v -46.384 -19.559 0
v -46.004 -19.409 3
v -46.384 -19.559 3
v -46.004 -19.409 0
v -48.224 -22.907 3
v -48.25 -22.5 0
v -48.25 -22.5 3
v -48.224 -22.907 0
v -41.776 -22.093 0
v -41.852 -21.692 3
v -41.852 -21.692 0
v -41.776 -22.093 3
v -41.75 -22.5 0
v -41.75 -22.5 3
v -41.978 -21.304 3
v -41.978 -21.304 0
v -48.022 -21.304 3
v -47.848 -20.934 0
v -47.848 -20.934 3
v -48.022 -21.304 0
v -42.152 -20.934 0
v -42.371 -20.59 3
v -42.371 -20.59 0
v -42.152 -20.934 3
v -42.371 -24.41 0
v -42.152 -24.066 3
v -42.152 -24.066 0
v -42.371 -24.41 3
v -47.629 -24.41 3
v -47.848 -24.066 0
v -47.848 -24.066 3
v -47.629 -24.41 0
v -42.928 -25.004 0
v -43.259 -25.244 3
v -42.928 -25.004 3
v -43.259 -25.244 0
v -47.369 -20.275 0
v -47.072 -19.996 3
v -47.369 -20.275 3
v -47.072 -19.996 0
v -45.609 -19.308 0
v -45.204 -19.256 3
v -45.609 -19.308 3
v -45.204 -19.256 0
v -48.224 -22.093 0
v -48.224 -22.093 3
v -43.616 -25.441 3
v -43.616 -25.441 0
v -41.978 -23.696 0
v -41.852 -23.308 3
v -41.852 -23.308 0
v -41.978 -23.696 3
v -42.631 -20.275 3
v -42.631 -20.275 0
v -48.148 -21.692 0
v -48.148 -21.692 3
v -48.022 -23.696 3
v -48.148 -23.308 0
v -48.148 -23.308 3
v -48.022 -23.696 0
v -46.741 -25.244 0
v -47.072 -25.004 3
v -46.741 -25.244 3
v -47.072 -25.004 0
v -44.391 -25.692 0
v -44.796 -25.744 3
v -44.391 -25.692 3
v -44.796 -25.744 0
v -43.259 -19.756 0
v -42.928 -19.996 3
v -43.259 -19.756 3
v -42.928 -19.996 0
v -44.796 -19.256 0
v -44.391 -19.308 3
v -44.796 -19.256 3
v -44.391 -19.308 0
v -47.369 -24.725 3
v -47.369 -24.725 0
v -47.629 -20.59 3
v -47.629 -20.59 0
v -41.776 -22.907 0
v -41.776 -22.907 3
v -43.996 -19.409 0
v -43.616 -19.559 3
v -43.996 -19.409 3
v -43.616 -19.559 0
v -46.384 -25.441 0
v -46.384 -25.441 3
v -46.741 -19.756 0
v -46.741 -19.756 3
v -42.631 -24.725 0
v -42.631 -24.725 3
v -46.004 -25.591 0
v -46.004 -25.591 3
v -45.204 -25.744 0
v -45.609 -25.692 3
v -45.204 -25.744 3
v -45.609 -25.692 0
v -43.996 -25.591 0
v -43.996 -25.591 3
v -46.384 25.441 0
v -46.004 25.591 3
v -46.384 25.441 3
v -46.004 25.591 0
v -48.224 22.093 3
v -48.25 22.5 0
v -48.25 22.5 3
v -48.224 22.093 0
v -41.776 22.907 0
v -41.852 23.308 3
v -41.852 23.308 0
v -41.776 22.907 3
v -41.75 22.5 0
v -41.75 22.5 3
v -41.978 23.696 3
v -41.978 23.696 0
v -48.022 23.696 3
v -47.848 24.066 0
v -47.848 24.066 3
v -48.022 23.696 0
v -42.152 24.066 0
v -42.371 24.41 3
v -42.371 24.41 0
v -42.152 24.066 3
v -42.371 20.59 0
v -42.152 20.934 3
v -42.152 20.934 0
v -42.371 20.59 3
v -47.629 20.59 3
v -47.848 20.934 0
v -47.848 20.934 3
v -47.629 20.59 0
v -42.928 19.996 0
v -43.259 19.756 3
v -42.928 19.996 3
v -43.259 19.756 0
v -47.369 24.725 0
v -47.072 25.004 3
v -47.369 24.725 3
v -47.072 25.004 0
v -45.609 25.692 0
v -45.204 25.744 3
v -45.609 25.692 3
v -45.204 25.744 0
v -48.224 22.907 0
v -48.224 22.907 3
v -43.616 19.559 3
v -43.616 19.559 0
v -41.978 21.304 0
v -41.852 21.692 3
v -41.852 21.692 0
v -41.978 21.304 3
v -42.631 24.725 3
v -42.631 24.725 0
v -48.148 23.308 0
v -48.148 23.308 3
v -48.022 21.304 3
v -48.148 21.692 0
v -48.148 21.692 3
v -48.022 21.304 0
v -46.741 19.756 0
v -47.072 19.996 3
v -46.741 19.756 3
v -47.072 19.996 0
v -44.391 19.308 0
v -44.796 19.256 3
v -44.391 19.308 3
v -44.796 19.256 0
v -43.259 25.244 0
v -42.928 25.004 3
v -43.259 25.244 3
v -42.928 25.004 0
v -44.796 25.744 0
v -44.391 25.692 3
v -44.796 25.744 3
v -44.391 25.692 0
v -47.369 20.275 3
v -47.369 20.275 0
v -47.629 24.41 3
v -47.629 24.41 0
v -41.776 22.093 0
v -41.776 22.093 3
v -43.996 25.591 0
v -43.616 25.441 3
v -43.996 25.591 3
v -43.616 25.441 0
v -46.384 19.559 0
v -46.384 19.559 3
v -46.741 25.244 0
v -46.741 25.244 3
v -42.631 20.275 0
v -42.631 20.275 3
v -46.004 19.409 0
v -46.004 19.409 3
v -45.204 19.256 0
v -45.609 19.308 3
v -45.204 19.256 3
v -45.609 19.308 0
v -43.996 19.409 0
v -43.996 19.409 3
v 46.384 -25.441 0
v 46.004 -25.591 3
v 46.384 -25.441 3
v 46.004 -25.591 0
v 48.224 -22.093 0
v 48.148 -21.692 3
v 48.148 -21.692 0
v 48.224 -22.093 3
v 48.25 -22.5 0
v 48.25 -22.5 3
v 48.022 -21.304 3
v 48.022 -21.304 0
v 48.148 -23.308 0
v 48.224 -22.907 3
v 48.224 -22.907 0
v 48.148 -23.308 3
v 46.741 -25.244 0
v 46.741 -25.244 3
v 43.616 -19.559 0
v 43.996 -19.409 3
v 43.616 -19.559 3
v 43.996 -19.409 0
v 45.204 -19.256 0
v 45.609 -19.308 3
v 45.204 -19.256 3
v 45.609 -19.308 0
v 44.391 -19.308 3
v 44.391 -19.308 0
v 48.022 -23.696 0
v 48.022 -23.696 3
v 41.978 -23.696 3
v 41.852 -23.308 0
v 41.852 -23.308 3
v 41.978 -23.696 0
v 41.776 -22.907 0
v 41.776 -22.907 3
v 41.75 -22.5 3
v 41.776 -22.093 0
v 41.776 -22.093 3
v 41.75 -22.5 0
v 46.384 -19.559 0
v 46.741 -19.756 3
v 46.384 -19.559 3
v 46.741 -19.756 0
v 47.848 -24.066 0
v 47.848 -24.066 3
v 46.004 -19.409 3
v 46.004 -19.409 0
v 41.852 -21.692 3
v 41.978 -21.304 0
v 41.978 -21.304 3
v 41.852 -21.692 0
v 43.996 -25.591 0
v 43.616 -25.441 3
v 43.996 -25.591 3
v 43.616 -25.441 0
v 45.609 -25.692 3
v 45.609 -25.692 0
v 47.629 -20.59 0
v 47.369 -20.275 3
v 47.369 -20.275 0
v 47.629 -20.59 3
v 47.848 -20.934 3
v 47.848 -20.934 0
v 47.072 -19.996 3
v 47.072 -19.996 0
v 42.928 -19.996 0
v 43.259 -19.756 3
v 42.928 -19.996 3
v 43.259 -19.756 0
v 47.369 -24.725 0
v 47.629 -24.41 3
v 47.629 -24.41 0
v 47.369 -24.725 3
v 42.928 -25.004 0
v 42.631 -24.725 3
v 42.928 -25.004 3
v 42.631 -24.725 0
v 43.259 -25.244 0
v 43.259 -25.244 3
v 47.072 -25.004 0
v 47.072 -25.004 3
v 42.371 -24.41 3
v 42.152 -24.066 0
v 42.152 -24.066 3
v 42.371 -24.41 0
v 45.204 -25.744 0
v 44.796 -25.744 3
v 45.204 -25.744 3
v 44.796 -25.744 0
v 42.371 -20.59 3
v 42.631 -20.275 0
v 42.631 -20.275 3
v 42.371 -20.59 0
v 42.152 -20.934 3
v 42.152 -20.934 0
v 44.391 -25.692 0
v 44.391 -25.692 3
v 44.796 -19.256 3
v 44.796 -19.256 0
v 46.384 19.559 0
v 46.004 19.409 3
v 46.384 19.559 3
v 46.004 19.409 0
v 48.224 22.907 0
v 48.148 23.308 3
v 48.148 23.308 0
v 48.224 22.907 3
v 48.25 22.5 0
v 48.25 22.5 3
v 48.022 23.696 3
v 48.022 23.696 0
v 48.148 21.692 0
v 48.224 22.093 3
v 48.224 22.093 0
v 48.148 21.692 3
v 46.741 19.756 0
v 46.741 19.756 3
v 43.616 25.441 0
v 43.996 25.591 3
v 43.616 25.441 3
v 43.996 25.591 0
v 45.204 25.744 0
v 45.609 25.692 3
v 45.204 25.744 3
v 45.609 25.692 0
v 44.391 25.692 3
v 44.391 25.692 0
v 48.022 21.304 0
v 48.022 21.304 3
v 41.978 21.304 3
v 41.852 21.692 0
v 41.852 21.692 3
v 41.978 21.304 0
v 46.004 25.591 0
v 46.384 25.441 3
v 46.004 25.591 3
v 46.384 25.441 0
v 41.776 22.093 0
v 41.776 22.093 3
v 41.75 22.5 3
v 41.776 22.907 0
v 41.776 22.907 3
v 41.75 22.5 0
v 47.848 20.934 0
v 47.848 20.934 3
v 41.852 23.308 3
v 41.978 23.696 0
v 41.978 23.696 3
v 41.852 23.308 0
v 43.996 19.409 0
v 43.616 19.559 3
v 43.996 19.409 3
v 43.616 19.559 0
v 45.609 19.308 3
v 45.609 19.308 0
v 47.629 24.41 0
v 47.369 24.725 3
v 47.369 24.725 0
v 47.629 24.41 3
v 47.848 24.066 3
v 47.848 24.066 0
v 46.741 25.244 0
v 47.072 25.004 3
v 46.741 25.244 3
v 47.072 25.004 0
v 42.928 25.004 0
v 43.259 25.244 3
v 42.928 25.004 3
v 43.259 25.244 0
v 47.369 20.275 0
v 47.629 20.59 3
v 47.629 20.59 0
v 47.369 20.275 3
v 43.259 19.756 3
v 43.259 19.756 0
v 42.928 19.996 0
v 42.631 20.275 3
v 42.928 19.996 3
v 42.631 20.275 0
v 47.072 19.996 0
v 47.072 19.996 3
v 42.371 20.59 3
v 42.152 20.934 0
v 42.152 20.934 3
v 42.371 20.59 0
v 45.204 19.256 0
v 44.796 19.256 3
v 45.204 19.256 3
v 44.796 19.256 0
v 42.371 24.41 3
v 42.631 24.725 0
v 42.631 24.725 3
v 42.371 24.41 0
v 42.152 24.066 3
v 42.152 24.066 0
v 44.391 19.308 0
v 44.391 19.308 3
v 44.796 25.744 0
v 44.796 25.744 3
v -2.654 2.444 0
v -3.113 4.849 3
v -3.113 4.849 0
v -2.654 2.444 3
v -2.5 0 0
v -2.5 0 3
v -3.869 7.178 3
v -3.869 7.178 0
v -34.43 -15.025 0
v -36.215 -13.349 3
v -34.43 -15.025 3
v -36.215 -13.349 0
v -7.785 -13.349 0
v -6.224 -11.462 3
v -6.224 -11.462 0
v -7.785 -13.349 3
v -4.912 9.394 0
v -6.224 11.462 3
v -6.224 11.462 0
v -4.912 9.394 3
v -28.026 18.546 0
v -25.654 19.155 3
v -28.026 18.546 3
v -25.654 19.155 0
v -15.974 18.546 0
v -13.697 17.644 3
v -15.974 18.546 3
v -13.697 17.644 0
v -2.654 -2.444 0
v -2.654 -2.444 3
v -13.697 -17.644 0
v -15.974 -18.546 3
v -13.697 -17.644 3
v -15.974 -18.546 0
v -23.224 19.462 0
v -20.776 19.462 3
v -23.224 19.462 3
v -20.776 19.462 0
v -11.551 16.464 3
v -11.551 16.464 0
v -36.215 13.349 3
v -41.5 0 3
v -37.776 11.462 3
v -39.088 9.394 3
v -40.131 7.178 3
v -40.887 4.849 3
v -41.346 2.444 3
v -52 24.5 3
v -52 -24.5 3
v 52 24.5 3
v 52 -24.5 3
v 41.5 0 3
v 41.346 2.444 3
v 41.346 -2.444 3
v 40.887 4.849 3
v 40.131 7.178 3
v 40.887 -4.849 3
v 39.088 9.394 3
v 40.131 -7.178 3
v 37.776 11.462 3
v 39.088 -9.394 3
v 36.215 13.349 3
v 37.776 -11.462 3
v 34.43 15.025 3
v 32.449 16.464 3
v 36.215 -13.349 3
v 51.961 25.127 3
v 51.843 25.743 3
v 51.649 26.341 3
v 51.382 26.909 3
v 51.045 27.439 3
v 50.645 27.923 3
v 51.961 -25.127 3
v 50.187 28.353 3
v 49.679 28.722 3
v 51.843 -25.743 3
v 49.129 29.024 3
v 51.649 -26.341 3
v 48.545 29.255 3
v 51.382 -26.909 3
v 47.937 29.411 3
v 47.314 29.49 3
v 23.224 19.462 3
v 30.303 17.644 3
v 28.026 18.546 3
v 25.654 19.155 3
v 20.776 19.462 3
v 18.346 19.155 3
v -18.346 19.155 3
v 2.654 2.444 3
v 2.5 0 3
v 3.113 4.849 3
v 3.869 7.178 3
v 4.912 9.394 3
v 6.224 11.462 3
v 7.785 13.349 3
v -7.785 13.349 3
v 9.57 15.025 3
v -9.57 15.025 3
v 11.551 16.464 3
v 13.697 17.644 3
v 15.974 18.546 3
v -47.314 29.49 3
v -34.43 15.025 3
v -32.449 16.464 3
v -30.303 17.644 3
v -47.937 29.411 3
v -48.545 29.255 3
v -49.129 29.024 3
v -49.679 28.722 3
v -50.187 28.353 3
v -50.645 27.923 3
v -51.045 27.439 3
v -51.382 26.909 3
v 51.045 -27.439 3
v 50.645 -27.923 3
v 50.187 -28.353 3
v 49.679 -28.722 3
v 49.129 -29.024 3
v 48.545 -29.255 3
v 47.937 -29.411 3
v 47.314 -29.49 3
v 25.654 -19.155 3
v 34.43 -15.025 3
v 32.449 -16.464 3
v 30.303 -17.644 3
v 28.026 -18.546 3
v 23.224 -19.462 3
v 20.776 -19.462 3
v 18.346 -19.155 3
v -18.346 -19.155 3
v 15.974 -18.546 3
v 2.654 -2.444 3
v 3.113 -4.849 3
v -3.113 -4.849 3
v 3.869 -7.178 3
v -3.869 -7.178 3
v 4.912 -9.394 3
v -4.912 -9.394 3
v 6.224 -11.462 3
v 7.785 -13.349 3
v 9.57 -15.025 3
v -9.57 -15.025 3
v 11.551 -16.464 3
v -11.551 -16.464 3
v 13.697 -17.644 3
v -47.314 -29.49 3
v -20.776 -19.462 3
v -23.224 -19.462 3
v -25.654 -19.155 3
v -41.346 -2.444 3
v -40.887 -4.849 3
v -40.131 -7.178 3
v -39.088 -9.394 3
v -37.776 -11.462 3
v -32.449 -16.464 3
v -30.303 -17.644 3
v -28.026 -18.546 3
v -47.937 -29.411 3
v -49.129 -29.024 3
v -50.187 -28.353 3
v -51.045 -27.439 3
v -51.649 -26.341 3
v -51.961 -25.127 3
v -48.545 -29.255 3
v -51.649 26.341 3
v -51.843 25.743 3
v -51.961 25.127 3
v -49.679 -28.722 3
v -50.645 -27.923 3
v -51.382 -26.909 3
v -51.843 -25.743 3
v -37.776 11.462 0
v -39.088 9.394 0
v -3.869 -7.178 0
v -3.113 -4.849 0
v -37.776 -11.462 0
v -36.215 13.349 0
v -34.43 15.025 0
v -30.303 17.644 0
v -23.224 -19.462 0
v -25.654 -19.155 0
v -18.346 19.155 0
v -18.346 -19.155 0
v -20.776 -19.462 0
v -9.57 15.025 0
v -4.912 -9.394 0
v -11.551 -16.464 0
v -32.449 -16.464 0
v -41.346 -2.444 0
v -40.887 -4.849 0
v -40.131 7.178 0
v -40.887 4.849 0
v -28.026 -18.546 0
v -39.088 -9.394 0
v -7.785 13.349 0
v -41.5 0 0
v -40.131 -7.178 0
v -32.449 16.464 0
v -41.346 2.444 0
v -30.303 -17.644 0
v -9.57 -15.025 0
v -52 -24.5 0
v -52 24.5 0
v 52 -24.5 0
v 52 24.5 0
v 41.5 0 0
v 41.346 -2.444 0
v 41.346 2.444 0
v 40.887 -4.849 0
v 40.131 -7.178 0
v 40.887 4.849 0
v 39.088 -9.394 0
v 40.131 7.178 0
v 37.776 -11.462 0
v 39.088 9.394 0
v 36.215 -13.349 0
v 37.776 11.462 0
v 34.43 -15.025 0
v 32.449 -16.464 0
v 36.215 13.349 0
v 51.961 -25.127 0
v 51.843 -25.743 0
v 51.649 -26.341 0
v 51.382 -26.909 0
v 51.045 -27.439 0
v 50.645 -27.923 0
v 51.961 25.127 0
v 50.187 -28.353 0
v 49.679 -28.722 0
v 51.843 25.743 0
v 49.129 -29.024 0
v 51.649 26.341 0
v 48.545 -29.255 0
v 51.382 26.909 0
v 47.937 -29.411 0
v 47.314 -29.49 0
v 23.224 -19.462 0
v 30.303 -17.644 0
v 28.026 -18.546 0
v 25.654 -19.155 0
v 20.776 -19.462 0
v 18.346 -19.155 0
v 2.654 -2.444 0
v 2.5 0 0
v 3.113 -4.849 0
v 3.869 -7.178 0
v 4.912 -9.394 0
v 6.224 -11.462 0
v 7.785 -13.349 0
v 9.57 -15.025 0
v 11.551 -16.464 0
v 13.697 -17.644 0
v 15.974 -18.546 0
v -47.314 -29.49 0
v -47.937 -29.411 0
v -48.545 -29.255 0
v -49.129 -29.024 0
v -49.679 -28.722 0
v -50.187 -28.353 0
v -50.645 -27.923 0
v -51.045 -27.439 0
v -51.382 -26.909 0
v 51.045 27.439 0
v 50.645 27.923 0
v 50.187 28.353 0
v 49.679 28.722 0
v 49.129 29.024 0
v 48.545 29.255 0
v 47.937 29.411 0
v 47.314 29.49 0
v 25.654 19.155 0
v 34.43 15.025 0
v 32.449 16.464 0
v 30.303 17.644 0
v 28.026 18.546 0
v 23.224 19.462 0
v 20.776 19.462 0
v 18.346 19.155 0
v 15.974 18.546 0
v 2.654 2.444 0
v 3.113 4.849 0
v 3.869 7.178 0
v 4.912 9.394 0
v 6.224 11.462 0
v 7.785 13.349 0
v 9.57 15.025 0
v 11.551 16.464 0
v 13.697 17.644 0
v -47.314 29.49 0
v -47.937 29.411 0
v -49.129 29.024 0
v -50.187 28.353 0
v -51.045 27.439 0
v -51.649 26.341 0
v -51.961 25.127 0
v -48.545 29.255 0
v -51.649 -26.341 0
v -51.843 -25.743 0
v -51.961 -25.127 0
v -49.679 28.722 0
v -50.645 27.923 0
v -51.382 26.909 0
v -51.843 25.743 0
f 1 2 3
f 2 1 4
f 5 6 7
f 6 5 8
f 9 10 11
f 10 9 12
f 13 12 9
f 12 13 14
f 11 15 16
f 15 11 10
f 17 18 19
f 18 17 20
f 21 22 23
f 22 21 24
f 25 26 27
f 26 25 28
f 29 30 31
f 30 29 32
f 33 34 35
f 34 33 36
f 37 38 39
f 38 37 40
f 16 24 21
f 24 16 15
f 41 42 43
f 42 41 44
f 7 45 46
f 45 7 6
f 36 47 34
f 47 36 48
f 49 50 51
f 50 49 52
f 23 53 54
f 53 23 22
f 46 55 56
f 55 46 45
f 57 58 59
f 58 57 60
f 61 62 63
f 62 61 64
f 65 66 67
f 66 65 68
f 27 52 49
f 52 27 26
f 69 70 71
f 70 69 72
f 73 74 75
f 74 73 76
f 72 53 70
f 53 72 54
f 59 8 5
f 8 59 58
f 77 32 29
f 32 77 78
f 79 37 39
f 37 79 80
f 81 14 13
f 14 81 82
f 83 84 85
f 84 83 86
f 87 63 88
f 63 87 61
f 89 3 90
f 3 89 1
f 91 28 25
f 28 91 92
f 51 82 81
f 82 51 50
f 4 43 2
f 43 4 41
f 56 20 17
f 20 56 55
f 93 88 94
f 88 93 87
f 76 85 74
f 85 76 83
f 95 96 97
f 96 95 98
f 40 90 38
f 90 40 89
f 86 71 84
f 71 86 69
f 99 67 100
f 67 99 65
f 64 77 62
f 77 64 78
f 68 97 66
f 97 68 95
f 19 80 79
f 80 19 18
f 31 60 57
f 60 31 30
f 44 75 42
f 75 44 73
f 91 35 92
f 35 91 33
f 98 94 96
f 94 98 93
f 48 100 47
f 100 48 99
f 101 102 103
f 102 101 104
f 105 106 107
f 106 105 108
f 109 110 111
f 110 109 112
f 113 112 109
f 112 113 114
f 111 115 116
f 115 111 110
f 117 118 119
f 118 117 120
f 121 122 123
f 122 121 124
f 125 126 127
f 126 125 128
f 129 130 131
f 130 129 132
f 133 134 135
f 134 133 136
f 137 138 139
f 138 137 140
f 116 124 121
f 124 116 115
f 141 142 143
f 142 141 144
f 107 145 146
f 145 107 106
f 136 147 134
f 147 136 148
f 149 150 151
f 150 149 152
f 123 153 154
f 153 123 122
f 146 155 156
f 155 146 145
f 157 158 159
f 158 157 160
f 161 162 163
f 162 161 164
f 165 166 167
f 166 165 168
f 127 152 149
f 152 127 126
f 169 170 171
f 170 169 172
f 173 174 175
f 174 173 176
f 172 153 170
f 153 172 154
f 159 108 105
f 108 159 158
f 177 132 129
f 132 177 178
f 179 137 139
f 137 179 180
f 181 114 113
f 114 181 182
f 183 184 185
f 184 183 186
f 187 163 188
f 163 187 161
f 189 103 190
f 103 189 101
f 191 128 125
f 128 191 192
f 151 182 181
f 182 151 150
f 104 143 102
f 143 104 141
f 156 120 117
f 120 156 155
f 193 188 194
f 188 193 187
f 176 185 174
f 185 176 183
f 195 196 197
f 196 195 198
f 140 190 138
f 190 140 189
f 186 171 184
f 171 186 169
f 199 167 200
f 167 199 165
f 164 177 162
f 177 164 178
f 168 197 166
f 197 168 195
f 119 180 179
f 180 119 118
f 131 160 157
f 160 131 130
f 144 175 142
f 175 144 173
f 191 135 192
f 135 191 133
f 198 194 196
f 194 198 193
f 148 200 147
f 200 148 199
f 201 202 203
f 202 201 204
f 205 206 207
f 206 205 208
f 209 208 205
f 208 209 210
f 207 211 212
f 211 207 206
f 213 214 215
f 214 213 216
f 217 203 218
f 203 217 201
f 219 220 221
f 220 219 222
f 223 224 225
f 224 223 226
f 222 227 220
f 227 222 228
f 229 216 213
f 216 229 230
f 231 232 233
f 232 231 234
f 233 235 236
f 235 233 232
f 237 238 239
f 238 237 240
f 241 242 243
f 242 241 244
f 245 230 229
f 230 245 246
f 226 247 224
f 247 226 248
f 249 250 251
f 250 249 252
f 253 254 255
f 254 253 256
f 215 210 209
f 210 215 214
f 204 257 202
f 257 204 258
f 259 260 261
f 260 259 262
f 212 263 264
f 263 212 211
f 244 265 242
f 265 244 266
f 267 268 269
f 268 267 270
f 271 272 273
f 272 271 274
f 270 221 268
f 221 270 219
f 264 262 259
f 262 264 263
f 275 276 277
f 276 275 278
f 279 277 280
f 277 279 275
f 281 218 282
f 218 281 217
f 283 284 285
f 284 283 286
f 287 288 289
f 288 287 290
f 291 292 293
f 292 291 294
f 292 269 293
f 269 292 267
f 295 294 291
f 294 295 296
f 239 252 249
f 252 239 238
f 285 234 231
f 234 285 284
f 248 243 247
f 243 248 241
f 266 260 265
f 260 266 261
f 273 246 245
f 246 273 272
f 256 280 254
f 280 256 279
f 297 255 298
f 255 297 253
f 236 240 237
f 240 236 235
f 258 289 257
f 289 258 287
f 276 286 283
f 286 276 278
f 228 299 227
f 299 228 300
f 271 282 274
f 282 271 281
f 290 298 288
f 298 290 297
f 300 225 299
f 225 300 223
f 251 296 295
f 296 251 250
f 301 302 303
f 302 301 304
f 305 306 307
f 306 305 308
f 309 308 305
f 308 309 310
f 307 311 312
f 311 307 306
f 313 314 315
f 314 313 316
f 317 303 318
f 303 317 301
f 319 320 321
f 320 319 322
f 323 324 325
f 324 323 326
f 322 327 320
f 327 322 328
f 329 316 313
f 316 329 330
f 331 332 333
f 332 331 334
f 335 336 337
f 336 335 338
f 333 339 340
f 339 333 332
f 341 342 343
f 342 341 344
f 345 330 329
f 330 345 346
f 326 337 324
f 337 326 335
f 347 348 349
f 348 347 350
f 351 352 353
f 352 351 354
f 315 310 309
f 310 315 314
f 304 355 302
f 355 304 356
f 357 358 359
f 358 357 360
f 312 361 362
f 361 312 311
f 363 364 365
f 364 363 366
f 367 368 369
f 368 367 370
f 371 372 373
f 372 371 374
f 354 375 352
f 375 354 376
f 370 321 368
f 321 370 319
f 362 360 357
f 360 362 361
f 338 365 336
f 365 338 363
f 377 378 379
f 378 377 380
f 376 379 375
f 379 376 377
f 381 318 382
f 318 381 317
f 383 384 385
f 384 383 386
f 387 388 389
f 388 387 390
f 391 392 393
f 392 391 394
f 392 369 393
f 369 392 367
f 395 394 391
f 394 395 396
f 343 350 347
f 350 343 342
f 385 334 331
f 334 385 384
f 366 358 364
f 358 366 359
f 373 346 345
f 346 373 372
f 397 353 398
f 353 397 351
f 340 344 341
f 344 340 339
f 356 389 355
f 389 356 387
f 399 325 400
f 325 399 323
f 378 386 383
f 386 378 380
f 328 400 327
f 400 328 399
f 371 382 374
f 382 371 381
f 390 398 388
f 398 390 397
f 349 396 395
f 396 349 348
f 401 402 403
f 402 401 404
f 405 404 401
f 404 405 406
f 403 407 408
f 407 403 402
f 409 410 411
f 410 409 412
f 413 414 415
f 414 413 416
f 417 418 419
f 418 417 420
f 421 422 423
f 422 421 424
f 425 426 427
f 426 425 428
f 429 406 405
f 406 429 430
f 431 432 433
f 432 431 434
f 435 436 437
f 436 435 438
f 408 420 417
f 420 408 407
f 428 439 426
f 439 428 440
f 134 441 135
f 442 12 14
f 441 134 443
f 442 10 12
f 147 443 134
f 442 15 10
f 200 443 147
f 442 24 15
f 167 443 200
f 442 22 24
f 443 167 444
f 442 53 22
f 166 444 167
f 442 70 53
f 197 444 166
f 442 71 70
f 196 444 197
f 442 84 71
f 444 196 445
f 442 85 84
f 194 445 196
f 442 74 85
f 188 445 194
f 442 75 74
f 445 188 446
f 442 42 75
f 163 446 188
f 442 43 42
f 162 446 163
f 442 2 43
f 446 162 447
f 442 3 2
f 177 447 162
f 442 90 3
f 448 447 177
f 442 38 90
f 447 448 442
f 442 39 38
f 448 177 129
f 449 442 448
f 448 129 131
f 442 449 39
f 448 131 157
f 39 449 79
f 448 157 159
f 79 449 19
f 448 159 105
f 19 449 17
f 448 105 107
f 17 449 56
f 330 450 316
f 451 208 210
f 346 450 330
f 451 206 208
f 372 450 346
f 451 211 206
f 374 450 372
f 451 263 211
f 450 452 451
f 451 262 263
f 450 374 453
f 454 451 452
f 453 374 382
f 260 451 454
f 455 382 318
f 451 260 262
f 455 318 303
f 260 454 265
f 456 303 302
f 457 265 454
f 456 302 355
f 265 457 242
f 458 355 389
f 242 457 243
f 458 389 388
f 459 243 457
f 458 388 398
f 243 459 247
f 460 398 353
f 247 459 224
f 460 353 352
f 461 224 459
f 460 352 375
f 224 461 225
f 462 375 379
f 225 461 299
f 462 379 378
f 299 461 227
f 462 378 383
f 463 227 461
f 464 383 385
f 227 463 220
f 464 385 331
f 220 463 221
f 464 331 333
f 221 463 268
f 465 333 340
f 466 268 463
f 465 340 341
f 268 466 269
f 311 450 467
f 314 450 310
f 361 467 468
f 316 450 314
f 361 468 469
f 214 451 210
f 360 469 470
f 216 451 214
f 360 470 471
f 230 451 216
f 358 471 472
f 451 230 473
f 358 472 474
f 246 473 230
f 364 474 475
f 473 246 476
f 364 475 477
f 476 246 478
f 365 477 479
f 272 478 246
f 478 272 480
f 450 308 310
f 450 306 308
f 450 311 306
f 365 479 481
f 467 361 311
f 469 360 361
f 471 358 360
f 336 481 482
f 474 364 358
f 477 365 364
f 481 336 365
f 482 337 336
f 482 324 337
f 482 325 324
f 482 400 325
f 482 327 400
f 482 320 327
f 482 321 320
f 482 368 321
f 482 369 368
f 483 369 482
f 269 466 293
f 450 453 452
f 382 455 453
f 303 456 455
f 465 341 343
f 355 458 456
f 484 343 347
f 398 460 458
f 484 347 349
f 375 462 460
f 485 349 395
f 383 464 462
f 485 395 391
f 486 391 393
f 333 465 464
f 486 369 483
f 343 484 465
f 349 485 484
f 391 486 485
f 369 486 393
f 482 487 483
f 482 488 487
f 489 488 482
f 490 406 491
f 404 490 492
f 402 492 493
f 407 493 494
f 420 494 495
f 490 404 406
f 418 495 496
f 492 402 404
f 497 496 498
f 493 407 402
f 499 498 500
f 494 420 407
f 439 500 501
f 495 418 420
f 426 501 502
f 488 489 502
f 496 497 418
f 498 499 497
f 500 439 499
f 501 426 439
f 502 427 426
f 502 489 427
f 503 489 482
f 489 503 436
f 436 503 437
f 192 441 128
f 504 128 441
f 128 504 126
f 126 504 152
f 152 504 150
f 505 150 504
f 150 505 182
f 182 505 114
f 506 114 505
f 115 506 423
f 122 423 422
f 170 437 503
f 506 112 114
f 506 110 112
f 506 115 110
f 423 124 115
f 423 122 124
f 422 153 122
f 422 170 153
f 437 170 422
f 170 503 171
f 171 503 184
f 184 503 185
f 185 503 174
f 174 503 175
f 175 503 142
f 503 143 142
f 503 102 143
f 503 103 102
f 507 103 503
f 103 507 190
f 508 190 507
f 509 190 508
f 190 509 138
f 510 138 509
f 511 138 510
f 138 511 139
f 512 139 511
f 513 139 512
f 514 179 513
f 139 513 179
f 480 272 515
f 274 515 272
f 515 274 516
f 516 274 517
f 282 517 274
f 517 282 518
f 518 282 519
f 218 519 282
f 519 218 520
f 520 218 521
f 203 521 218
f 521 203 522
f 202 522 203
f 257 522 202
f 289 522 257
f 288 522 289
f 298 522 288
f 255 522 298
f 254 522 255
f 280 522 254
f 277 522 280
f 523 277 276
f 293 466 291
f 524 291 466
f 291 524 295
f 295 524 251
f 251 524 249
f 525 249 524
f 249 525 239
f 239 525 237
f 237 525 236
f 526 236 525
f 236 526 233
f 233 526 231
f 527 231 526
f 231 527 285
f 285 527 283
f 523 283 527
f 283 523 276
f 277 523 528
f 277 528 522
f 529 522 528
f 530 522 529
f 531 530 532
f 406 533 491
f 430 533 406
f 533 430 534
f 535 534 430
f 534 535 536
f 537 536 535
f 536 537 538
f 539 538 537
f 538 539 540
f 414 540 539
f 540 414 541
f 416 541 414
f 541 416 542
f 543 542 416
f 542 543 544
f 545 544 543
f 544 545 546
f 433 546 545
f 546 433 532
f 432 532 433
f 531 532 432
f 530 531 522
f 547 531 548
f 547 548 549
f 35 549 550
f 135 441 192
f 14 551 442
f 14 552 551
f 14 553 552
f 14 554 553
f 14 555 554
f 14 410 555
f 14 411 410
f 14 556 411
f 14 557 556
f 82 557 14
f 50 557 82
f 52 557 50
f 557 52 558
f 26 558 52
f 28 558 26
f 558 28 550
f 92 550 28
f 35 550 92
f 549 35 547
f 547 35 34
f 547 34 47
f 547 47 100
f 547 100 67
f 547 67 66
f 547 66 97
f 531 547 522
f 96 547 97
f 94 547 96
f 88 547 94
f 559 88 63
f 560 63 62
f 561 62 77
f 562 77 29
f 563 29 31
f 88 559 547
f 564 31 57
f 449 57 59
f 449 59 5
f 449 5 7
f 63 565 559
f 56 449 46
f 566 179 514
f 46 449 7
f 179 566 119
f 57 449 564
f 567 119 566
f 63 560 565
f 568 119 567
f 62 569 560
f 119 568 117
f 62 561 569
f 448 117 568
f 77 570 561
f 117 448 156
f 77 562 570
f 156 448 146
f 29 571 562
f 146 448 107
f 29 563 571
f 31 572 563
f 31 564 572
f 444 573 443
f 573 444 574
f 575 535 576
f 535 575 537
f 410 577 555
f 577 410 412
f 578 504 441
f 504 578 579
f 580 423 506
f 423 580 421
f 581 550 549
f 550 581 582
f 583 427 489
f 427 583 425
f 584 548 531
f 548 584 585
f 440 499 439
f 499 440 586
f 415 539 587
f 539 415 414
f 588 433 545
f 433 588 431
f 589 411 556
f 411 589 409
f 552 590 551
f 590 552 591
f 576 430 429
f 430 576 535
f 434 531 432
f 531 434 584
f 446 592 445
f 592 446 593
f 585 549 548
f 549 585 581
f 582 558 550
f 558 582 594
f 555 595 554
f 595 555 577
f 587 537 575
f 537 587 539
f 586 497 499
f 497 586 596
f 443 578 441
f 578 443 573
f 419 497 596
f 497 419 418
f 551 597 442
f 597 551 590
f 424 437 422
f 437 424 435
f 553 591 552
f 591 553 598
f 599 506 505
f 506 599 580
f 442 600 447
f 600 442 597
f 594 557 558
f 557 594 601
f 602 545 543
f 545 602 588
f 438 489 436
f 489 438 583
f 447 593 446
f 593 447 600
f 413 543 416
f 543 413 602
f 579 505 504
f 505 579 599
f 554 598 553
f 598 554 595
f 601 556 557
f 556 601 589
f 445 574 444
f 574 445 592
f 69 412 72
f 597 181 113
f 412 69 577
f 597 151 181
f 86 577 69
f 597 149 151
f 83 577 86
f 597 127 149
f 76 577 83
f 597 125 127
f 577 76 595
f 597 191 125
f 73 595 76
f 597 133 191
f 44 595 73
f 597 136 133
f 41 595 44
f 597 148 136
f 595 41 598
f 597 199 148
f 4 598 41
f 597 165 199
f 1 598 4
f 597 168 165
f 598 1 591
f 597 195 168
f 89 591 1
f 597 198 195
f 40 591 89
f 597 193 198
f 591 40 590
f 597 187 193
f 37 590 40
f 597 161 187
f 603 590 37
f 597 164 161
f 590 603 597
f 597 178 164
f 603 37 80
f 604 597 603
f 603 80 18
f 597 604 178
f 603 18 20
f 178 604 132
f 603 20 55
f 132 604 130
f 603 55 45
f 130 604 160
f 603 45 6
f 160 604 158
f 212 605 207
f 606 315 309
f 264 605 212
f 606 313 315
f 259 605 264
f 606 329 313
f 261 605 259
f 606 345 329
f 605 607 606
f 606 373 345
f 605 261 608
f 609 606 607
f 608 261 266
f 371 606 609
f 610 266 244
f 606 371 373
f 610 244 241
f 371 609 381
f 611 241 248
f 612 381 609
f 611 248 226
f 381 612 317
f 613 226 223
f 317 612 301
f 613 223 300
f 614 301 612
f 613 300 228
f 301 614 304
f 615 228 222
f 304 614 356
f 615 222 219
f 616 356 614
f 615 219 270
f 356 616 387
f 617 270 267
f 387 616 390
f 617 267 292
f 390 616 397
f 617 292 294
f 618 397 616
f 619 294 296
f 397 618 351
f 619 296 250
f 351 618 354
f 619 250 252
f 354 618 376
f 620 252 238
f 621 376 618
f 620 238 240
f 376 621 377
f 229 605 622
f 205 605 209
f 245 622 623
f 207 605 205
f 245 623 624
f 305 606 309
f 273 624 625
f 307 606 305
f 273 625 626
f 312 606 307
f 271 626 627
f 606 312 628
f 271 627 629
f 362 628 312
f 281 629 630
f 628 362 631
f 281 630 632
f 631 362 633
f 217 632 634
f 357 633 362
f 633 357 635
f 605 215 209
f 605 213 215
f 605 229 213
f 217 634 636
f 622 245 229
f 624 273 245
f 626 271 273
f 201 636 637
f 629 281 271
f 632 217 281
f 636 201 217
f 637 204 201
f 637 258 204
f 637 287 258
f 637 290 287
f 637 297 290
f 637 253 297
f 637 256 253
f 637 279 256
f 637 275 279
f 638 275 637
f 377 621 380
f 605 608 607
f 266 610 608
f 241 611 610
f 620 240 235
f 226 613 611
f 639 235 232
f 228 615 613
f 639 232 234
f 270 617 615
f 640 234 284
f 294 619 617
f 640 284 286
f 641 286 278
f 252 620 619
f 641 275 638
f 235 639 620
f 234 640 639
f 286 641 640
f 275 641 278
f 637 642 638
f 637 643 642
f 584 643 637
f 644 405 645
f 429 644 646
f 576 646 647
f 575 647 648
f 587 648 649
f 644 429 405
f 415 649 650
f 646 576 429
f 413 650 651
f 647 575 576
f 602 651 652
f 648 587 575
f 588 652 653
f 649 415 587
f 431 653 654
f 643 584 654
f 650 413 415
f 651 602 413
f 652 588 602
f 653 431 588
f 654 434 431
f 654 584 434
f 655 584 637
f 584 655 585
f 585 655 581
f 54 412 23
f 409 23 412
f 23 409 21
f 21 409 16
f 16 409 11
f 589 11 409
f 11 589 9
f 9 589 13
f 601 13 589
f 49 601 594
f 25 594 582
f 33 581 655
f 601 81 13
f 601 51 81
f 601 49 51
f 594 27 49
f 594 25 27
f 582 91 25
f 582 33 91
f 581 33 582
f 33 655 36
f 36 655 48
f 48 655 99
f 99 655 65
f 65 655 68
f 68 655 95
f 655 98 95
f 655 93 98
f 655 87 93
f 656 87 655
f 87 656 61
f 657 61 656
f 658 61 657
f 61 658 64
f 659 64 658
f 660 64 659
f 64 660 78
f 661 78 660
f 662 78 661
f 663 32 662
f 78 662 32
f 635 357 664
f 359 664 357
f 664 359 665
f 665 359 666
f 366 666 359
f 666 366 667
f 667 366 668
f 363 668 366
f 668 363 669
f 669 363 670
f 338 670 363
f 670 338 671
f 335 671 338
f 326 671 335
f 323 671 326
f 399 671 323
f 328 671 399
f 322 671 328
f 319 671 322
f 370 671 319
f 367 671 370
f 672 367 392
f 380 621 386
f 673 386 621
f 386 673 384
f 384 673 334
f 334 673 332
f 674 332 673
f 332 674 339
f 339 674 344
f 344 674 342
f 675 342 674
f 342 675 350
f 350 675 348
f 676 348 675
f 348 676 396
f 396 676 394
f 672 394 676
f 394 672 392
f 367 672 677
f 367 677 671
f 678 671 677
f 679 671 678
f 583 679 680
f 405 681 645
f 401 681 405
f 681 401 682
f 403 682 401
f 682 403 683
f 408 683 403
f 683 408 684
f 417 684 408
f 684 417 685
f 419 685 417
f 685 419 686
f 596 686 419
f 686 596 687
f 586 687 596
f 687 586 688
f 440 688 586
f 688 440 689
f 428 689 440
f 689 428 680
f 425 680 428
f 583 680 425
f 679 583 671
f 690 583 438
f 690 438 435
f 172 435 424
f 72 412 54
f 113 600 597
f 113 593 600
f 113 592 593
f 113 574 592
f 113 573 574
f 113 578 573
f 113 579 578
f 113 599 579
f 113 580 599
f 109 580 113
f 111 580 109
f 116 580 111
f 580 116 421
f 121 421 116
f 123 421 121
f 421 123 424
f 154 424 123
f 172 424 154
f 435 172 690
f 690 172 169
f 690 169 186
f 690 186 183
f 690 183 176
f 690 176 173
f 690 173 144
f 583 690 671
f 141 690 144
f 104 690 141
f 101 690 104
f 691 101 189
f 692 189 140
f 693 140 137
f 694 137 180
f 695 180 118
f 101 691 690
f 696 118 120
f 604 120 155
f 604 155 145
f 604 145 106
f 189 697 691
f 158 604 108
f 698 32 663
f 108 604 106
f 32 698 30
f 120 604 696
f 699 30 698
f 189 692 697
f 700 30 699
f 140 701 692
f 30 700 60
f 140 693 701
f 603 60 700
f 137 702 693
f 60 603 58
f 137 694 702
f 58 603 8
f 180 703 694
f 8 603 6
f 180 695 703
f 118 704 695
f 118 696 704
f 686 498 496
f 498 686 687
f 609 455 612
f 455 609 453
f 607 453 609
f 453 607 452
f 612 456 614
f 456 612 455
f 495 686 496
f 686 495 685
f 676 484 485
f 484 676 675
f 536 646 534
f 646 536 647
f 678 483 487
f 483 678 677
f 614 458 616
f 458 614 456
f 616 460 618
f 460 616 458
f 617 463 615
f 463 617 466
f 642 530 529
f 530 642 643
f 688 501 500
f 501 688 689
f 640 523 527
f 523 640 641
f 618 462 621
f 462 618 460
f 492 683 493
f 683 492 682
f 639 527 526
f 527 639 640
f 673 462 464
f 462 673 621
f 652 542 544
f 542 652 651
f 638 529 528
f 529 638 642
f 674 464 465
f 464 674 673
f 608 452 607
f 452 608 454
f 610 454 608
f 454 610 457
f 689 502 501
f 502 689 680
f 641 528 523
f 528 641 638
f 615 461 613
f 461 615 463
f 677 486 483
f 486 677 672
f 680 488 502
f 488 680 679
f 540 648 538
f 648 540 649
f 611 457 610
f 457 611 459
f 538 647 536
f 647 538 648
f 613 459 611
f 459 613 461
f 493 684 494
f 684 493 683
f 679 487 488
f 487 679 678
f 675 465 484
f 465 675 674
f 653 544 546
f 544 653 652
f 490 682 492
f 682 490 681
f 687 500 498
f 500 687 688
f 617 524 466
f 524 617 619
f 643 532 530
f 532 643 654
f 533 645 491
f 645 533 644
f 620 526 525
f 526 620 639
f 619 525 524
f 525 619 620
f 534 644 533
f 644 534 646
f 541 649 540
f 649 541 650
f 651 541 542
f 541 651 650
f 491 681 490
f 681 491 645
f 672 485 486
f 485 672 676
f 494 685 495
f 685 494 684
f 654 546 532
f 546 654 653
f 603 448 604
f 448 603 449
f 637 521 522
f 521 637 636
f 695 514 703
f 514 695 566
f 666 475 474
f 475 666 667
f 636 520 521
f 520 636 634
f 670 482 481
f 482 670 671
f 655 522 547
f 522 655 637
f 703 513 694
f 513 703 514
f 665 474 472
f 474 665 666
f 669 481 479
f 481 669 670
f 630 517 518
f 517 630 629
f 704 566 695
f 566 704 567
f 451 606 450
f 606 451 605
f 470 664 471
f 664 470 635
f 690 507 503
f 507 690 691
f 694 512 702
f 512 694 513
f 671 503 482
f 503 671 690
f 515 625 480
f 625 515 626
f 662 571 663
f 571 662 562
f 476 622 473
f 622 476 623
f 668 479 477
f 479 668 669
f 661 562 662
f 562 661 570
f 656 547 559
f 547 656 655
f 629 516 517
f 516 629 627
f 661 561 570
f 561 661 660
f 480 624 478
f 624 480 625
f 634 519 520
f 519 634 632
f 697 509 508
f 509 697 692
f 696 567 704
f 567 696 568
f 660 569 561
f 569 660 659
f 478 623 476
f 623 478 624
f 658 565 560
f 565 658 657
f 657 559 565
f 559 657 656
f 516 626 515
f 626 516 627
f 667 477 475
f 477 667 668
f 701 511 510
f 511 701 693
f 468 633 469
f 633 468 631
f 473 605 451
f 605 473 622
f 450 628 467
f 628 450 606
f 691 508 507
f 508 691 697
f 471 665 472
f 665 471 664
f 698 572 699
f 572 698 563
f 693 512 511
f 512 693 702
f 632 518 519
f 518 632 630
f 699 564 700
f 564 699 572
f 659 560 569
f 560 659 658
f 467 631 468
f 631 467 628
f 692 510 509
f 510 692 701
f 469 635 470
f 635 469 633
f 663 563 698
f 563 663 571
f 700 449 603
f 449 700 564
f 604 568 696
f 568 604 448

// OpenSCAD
$fn = 50;


difference() {
	union() {
		hull() {
			translate(v = [-47.0000000000, 24.5000000000, 0]) {
				cylinder(h = 3, r = 5);
			}
			translate(v = [47.0000000000, 24.5000000000, 0]) {
				cylinder(h = 3, r = 5);
			}
			translate(v = [-47.0000000000, -24.5000000000, 0]) {
				cylinder(h = 3, r = 5);
			}
			translate(v = [47.0000000000, -24.5000000000, 0]) {
				cylinder(h = 3, r = 5);
			}
		}
	}
	union() {
		#translate(v = [-45.0000000000, -22.5000000000, -100.0000000000]) {
			cylinder(h = 200, r = 3.2500000000);
		}
		#translate(v = [-45.0000000000, 22.5000000000, -100.0000000000]) {
			cylinder(h = 200, r = 3.2500000000);
		}
		#translate(v = [45.0000000000, -22.5000000000, -100.0000000000]) {
			cylinder(h = 200, r = 3.2500000000);
		}
		#translate(v = [45.0000000000, 22.5000000000, -100.0000000000]) {
			cylinder(h = 200, r = 3.2500000000);
		}
		#translate(v = [-22.0000000000, 0, 0]) {
			cylinder(h = 3, r = 19.5000000000);
		}
		#translate(v = [22.0000000000, 0, 0]) {
			cylinder(h = 3, r = 19.5000000000);
		}
	}
}
